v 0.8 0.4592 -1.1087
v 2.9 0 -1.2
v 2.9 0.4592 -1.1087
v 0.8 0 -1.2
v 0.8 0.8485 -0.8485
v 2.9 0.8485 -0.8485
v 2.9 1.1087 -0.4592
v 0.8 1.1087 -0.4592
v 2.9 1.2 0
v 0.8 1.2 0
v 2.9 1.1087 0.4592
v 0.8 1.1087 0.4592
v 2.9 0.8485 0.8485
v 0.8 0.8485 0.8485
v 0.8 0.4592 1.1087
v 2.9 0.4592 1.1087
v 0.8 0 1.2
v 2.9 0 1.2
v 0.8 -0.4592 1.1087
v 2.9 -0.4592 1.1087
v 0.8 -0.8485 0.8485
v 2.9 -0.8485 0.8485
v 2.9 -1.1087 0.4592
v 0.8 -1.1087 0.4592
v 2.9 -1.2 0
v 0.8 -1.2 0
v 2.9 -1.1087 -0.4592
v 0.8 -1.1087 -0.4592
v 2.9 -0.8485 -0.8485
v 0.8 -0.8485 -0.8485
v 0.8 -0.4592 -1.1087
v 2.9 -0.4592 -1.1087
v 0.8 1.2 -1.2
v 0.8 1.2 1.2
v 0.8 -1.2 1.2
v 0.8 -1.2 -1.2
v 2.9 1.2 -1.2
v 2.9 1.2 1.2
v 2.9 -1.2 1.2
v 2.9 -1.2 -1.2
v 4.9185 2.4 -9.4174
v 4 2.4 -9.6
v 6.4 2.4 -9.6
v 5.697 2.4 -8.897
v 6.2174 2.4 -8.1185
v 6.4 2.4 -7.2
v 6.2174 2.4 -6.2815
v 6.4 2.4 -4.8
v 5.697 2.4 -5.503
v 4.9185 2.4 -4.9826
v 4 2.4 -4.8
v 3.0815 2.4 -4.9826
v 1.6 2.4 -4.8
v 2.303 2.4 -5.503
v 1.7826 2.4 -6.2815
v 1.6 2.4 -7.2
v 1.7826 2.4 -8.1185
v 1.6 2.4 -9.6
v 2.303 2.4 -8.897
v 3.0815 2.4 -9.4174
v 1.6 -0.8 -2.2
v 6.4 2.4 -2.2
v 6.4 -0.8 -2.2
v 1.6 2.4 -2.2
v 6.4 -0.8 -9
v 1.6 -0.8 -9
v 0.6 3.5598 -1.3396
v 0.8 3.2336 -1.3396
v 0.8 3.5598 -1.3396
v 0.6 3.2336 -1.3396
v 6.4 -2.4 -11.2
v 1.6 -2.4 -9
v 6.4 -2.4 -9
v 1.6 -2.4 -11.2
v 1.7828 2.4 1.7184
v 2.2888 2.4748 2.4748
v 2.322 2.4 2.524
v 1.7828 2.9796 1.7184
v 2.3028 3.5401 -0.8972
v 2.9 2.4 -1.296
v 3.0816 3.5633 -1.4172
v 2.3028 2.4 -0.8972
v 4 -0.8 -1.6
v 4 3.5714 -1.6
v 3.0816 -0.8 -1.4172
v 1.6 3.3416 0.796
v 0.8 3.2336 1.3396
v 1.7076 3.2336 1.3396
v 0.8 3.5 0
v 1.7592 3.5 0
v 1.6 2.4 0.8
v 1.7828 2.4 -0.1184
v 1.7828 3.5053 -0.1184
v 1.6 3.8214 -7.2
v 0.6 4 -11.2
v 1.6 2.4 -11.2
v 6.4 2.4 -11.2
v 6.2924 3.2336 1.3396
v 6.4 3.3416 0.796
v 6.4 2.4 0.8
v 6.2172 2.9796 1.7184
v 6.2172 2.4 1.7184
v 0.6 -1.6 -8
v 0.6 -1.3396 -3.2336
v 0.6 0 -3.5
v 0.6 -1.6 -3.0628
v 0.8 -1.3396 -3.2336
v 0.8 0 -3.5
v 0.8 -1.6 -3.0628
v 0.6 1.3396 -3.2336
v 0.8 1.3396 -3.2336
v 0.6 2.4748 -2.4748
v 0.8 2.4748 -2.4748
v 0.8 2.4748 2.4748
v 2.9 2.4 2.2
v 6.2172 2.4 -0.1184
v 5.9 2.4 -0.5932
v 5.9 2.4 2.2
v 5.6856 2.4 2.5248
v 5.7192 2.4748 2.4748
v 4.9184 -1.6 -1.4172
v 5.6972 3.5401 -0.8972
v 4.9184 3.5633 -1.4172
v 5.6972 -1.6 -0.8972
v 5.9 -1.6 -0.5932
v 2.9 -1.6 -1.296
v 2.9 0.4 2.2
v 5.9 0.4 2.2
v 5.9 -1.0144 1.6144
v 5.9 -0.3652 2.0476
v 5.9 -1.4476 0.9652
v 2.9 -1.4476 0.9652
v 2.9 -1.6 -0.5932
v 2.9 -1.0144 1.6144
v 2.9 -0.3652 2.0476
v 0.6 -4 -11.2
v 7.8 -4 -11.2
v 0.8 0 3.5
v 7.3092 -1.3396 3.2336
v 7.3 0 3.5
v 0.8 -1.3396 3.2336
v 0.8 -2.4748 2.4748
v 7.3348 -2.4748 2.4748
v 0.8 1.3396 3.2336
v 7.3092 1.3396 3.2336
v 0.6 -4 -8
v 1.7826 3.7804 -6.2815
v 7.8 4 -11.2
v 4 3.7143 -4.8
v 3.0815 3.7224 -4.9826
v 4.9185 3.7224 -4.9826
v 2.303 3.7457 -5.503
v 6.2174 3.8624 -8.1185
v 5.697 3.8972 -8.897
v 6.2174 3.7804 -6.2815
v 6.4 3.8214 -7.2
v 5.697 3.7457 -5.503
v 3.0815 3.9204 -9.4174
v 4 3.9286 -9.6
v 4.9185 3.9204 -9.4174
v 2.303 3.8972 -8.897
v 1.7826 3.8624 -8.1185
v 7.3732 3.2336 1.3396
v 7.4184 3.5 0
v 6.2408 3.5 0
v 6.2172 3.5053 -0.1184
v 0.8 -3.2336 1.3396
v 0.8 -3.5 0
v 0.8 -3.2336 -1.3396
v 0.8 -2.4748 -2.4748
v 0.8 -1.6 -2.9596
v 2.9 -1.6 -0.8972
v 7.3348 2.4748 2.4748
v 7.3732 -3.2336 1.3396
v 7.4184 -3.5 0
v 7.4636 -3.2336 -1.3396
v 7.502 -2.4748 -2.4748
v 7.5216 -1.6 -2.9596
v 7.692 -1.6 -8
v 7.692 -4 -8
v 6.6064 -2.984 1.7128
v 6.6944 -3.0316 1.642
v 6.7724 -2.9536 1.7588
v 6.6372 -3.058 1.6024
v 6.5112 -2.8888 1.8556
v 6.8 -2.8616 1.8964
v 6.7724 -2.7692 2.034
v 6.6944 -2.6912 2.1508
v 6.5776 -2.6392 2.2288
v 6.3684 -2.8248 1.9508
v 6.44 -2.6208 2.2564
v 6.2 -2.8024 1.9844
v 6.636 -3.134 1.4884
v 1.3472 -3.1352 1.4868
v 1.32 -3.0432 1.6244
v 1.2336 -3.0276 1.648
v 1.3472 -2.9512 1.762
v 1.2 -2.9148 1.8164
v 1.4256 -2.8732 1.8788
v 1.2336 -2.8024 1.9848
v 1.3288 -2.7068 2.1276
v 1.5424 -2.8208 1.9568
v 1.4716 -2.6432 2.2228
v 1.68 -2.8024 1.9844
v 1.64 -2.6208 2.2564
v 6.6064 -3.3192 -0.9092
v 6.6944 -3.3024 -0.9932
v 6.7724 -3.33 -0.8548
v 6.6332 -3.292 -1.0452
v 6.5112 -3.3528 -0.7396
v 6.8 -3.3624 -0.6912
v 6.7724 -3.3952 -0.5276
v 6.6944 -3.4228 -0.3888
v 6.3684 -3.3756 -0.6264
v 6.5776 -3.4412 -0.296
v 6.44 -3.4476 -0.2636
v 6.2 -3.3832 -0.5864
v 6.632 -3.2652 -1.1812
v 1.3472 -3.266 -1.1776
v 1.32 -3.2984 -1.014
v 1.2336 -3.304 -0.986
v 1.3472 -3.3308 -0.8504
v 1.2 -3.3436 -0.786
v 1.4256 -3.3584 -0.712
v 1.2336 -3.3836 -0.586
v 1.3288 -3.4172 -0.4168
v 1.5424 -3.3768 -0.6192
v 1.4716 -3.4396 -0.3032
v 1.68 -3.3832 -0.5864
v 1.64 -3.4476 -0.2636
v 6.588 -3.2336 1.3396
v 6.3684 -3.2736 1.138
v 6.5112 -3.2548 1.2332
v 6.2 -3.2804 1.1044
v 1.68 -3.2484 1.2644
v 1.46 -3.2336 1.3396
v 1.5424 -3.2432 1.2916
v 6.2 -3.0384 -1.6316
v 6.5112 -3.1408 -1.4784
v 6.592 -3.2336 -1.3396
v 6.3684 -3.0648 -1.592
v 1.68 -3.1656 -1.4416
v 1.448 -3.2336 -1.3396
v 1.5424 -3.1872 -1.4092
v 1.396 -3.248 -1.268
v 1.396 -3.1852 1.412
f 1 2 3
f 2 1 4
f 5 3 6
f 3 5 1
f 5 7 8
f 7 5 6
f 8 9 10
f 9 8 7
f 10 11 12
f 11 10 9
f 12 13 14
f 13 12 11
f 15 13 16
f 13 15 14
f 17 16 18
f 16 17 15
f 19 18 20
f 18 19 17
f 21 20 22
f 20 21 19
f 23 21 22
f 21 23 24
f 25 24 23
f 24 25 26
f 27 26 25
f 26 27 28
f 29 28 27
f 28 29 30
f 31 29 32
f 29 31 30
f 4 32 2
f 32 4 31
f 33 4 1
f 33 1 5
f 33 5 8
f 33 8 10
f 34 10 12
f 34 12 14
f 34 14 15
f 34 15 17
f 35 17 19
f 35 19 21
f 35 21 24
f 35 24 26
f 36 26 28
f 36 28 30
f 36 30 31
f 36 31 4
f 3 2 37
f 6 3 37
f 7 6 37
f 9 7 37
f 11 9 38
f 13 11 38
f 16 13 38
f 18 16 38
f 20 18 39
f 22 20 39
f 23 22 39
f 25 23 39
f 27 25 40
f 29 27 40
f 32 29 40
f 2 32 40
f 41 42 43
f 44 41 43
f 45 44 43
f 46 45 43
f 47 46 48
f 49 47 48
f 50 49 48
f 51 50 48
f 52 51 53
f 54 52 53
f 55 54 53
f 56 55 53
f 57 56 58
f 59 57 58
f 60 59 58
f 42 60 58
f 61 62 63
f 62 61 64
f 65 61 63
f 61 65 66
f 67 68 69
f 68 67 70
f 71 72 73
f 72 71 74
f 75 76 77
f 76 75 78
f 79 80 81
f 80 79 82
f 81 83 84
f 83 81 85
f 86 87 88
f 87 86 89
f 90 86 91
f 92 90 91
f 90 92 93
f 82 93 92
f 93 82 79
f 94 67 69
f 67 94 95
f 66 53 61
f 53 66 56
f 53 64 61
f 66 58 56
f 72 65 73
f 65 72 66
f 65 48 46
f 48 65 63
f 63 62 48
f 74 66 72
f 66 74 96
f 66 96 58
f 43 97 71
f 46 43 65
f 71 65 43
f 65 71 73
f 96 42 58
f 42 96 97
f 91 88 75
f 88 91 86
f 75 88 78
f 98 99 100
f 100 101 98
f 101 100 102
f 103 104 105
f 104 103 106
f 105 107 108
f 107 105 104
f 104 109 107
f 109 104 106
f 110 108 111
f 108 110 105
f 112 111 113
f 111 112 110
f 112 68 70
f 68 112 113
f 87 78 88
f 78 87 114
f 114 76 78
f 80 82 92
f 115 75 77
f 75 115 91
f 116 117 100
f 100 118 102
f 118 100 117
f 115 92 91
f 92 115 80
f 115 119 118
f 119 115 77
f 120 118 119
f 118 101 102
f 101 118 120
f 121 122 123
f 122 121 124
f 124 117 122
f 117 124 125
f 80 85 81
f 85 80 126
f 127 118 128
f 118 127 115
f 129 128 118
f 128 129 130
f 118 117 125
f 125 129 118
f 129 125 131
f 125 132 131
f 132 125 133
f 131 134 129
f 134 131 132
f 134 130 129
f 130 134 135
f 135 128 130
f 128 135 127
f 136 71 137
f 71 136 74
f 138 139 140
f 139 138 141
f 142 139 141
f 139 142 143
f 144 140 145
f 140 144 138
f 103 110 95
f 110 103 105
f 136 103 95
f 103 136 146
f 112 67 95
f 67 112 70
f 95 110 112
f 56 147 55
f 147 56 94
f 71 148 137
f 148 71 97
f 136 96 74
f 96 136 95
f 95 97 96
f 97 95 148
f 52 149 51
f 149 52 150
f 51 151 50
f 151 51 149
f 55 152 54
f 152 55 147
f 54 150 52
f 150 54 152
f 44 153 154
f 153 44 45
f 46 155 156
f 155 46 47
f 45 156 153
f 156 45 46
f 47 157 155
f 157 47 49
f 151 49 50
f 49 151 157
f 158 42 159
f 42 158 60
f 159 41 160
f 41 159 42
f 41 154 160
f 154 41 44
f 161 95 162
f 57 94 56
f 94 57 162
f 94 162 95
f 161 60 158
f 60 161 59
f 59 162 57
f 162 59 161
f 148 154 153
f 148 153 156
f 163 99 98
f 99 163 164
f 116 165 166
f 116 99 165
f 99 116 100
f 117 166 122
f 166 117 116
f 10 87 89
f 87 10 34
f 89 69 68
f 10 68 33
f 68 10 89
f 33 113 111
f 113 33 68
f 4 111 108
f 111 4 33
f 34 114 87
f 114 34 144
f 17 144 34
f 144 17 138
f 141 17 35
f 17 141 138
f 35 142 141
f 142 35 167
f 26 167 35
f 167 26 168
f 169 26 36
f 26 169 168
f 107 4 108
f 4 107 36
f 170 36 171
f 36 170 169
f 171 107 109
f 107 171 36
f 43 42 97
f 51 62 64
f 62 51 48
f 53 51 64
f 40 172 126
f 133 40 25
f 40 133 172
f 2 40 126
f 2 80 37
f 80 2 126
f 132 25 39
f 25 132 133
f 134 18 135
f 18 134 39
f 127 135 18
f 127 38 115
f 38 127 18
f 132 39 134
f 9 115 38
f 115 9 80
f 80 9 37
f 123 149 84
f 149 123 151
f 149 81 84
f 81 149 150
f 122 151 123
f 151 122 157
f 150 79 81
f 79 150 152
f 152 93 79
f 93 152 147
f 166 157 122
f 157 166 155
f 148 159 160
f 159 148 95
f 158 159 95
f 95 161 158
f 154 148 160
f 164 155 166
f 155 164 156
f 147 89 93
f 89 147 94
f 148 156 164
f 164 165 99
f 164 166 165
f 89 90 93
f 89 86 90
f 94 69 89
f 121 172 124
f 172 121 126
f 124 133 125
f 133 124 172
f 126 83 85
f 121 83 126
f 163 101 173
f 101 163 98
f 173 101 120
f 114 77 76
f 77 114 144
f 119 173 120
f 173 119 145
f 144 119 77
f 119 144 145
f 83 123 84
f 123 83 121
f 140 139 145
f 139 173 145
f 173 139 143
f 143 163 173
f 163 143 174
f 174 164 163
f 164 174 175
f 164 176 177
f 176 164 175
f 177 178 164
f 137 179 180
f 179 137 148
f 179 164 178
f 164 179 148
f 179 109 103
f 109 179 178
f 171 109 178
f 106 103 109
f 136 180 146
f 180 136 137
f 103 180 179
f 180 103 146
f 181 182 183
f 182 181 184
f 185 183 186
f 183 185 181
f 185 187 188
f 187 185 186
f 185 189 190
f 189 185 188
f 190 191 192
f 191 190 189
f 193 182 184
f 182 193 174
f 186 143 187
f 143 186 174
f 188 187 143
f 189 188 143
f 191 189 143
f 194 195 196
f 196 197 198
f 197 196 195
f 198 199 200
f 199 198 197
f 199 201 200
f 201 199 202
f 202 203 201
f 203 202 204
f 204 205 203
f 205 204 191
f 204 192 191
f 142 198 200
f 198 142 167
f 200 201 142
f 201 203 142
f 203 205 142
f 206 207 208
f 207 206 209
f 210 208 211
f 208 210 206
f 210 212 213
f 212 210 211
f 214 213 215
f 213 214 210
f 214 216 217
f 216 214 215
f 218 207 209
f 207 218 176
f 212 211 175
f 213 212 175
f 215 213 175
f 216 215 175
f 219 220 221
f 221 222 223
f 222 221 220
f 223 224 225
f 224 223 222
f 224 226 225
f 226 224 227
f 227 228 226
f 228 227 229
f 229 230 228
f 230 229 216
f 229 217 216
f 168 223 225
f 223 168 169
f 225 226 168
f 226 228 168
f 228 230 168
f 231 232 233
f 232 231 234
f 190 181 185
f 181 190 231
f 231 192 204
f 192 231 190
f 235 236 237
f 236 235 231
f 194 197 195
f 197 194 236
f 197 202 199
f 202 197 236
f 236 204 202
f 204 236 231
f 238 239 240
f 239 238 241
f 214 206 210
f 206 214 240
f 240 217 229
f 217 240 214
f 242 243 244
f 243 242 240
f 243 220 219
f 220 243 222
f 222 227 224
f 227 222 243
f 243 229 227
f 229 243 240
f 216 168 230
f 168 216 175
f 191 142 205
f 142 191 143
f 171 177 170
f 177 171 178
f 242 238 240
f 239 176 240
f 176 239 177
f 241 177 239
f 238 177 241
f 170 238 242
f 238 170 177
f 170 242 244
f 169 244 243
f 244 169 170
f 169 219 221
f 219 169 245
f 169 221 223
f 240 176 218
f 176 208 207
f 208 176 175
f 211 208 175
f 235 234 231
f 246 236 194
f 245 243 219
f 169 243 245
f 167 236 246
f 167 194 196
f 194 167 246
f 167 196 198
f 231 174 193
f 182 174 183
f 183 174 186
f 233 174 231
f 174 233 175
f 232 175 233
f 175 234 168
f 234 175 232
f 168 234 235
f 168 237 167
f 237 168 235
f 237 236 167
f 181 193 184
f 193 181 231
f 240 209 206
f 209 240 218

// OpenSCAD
use <../lib.scad>
use <3816bp6f.scad>
function ldraw_lib__3817bp6f() = [
// 0 Minifig Leg Left with Astro Pattern
// 0 Name: 3817bp6f.dat
// 0 Author: Chris Dee [cwdee]
// 0 !LDRAW_ORG Part UPDATE 2020-03
// 0 !LICENSE Licensed under CC BY 2.0 and CC BY 4.0 : see CAreadme.txt
// 
// 0 BFC CERTIFY CCW
  [0,"BFC","CERTIFY"],
  [0,"BFC","CCW"],
// 
// 0 !KEYWORDS Astrobots
// 
// 0 !HISTORY 2020-06-02 [pneaster] Original pattern design
// 0 !HISTORY 2020-06-02 [cwdee] Adapted to corrected geometry
// 0 !HISTORY 2020-12-29 [PTadmin] Official Update 2020-03
// 
// 
// 1 16 0 0 0 -1 0 0 0 1 0 0 0 1 3816bp6f.dat
  [1,16,0,0,0,-1,0,0,0,1,0,0,0,1, ldraw_lib__3816bp6f()],
];
module ldraw_lib__3817bp6f(step=0, col=false, unit=2/5, alt=false, line=0.2, solid=!$preview)
    makepoly(ldraw_lib__3817bp6f(), step=step, col=col, unit=unit, alt=alt, line=line, solid=solid);
ldraw_lib__3817bp6f(line=0.2);
